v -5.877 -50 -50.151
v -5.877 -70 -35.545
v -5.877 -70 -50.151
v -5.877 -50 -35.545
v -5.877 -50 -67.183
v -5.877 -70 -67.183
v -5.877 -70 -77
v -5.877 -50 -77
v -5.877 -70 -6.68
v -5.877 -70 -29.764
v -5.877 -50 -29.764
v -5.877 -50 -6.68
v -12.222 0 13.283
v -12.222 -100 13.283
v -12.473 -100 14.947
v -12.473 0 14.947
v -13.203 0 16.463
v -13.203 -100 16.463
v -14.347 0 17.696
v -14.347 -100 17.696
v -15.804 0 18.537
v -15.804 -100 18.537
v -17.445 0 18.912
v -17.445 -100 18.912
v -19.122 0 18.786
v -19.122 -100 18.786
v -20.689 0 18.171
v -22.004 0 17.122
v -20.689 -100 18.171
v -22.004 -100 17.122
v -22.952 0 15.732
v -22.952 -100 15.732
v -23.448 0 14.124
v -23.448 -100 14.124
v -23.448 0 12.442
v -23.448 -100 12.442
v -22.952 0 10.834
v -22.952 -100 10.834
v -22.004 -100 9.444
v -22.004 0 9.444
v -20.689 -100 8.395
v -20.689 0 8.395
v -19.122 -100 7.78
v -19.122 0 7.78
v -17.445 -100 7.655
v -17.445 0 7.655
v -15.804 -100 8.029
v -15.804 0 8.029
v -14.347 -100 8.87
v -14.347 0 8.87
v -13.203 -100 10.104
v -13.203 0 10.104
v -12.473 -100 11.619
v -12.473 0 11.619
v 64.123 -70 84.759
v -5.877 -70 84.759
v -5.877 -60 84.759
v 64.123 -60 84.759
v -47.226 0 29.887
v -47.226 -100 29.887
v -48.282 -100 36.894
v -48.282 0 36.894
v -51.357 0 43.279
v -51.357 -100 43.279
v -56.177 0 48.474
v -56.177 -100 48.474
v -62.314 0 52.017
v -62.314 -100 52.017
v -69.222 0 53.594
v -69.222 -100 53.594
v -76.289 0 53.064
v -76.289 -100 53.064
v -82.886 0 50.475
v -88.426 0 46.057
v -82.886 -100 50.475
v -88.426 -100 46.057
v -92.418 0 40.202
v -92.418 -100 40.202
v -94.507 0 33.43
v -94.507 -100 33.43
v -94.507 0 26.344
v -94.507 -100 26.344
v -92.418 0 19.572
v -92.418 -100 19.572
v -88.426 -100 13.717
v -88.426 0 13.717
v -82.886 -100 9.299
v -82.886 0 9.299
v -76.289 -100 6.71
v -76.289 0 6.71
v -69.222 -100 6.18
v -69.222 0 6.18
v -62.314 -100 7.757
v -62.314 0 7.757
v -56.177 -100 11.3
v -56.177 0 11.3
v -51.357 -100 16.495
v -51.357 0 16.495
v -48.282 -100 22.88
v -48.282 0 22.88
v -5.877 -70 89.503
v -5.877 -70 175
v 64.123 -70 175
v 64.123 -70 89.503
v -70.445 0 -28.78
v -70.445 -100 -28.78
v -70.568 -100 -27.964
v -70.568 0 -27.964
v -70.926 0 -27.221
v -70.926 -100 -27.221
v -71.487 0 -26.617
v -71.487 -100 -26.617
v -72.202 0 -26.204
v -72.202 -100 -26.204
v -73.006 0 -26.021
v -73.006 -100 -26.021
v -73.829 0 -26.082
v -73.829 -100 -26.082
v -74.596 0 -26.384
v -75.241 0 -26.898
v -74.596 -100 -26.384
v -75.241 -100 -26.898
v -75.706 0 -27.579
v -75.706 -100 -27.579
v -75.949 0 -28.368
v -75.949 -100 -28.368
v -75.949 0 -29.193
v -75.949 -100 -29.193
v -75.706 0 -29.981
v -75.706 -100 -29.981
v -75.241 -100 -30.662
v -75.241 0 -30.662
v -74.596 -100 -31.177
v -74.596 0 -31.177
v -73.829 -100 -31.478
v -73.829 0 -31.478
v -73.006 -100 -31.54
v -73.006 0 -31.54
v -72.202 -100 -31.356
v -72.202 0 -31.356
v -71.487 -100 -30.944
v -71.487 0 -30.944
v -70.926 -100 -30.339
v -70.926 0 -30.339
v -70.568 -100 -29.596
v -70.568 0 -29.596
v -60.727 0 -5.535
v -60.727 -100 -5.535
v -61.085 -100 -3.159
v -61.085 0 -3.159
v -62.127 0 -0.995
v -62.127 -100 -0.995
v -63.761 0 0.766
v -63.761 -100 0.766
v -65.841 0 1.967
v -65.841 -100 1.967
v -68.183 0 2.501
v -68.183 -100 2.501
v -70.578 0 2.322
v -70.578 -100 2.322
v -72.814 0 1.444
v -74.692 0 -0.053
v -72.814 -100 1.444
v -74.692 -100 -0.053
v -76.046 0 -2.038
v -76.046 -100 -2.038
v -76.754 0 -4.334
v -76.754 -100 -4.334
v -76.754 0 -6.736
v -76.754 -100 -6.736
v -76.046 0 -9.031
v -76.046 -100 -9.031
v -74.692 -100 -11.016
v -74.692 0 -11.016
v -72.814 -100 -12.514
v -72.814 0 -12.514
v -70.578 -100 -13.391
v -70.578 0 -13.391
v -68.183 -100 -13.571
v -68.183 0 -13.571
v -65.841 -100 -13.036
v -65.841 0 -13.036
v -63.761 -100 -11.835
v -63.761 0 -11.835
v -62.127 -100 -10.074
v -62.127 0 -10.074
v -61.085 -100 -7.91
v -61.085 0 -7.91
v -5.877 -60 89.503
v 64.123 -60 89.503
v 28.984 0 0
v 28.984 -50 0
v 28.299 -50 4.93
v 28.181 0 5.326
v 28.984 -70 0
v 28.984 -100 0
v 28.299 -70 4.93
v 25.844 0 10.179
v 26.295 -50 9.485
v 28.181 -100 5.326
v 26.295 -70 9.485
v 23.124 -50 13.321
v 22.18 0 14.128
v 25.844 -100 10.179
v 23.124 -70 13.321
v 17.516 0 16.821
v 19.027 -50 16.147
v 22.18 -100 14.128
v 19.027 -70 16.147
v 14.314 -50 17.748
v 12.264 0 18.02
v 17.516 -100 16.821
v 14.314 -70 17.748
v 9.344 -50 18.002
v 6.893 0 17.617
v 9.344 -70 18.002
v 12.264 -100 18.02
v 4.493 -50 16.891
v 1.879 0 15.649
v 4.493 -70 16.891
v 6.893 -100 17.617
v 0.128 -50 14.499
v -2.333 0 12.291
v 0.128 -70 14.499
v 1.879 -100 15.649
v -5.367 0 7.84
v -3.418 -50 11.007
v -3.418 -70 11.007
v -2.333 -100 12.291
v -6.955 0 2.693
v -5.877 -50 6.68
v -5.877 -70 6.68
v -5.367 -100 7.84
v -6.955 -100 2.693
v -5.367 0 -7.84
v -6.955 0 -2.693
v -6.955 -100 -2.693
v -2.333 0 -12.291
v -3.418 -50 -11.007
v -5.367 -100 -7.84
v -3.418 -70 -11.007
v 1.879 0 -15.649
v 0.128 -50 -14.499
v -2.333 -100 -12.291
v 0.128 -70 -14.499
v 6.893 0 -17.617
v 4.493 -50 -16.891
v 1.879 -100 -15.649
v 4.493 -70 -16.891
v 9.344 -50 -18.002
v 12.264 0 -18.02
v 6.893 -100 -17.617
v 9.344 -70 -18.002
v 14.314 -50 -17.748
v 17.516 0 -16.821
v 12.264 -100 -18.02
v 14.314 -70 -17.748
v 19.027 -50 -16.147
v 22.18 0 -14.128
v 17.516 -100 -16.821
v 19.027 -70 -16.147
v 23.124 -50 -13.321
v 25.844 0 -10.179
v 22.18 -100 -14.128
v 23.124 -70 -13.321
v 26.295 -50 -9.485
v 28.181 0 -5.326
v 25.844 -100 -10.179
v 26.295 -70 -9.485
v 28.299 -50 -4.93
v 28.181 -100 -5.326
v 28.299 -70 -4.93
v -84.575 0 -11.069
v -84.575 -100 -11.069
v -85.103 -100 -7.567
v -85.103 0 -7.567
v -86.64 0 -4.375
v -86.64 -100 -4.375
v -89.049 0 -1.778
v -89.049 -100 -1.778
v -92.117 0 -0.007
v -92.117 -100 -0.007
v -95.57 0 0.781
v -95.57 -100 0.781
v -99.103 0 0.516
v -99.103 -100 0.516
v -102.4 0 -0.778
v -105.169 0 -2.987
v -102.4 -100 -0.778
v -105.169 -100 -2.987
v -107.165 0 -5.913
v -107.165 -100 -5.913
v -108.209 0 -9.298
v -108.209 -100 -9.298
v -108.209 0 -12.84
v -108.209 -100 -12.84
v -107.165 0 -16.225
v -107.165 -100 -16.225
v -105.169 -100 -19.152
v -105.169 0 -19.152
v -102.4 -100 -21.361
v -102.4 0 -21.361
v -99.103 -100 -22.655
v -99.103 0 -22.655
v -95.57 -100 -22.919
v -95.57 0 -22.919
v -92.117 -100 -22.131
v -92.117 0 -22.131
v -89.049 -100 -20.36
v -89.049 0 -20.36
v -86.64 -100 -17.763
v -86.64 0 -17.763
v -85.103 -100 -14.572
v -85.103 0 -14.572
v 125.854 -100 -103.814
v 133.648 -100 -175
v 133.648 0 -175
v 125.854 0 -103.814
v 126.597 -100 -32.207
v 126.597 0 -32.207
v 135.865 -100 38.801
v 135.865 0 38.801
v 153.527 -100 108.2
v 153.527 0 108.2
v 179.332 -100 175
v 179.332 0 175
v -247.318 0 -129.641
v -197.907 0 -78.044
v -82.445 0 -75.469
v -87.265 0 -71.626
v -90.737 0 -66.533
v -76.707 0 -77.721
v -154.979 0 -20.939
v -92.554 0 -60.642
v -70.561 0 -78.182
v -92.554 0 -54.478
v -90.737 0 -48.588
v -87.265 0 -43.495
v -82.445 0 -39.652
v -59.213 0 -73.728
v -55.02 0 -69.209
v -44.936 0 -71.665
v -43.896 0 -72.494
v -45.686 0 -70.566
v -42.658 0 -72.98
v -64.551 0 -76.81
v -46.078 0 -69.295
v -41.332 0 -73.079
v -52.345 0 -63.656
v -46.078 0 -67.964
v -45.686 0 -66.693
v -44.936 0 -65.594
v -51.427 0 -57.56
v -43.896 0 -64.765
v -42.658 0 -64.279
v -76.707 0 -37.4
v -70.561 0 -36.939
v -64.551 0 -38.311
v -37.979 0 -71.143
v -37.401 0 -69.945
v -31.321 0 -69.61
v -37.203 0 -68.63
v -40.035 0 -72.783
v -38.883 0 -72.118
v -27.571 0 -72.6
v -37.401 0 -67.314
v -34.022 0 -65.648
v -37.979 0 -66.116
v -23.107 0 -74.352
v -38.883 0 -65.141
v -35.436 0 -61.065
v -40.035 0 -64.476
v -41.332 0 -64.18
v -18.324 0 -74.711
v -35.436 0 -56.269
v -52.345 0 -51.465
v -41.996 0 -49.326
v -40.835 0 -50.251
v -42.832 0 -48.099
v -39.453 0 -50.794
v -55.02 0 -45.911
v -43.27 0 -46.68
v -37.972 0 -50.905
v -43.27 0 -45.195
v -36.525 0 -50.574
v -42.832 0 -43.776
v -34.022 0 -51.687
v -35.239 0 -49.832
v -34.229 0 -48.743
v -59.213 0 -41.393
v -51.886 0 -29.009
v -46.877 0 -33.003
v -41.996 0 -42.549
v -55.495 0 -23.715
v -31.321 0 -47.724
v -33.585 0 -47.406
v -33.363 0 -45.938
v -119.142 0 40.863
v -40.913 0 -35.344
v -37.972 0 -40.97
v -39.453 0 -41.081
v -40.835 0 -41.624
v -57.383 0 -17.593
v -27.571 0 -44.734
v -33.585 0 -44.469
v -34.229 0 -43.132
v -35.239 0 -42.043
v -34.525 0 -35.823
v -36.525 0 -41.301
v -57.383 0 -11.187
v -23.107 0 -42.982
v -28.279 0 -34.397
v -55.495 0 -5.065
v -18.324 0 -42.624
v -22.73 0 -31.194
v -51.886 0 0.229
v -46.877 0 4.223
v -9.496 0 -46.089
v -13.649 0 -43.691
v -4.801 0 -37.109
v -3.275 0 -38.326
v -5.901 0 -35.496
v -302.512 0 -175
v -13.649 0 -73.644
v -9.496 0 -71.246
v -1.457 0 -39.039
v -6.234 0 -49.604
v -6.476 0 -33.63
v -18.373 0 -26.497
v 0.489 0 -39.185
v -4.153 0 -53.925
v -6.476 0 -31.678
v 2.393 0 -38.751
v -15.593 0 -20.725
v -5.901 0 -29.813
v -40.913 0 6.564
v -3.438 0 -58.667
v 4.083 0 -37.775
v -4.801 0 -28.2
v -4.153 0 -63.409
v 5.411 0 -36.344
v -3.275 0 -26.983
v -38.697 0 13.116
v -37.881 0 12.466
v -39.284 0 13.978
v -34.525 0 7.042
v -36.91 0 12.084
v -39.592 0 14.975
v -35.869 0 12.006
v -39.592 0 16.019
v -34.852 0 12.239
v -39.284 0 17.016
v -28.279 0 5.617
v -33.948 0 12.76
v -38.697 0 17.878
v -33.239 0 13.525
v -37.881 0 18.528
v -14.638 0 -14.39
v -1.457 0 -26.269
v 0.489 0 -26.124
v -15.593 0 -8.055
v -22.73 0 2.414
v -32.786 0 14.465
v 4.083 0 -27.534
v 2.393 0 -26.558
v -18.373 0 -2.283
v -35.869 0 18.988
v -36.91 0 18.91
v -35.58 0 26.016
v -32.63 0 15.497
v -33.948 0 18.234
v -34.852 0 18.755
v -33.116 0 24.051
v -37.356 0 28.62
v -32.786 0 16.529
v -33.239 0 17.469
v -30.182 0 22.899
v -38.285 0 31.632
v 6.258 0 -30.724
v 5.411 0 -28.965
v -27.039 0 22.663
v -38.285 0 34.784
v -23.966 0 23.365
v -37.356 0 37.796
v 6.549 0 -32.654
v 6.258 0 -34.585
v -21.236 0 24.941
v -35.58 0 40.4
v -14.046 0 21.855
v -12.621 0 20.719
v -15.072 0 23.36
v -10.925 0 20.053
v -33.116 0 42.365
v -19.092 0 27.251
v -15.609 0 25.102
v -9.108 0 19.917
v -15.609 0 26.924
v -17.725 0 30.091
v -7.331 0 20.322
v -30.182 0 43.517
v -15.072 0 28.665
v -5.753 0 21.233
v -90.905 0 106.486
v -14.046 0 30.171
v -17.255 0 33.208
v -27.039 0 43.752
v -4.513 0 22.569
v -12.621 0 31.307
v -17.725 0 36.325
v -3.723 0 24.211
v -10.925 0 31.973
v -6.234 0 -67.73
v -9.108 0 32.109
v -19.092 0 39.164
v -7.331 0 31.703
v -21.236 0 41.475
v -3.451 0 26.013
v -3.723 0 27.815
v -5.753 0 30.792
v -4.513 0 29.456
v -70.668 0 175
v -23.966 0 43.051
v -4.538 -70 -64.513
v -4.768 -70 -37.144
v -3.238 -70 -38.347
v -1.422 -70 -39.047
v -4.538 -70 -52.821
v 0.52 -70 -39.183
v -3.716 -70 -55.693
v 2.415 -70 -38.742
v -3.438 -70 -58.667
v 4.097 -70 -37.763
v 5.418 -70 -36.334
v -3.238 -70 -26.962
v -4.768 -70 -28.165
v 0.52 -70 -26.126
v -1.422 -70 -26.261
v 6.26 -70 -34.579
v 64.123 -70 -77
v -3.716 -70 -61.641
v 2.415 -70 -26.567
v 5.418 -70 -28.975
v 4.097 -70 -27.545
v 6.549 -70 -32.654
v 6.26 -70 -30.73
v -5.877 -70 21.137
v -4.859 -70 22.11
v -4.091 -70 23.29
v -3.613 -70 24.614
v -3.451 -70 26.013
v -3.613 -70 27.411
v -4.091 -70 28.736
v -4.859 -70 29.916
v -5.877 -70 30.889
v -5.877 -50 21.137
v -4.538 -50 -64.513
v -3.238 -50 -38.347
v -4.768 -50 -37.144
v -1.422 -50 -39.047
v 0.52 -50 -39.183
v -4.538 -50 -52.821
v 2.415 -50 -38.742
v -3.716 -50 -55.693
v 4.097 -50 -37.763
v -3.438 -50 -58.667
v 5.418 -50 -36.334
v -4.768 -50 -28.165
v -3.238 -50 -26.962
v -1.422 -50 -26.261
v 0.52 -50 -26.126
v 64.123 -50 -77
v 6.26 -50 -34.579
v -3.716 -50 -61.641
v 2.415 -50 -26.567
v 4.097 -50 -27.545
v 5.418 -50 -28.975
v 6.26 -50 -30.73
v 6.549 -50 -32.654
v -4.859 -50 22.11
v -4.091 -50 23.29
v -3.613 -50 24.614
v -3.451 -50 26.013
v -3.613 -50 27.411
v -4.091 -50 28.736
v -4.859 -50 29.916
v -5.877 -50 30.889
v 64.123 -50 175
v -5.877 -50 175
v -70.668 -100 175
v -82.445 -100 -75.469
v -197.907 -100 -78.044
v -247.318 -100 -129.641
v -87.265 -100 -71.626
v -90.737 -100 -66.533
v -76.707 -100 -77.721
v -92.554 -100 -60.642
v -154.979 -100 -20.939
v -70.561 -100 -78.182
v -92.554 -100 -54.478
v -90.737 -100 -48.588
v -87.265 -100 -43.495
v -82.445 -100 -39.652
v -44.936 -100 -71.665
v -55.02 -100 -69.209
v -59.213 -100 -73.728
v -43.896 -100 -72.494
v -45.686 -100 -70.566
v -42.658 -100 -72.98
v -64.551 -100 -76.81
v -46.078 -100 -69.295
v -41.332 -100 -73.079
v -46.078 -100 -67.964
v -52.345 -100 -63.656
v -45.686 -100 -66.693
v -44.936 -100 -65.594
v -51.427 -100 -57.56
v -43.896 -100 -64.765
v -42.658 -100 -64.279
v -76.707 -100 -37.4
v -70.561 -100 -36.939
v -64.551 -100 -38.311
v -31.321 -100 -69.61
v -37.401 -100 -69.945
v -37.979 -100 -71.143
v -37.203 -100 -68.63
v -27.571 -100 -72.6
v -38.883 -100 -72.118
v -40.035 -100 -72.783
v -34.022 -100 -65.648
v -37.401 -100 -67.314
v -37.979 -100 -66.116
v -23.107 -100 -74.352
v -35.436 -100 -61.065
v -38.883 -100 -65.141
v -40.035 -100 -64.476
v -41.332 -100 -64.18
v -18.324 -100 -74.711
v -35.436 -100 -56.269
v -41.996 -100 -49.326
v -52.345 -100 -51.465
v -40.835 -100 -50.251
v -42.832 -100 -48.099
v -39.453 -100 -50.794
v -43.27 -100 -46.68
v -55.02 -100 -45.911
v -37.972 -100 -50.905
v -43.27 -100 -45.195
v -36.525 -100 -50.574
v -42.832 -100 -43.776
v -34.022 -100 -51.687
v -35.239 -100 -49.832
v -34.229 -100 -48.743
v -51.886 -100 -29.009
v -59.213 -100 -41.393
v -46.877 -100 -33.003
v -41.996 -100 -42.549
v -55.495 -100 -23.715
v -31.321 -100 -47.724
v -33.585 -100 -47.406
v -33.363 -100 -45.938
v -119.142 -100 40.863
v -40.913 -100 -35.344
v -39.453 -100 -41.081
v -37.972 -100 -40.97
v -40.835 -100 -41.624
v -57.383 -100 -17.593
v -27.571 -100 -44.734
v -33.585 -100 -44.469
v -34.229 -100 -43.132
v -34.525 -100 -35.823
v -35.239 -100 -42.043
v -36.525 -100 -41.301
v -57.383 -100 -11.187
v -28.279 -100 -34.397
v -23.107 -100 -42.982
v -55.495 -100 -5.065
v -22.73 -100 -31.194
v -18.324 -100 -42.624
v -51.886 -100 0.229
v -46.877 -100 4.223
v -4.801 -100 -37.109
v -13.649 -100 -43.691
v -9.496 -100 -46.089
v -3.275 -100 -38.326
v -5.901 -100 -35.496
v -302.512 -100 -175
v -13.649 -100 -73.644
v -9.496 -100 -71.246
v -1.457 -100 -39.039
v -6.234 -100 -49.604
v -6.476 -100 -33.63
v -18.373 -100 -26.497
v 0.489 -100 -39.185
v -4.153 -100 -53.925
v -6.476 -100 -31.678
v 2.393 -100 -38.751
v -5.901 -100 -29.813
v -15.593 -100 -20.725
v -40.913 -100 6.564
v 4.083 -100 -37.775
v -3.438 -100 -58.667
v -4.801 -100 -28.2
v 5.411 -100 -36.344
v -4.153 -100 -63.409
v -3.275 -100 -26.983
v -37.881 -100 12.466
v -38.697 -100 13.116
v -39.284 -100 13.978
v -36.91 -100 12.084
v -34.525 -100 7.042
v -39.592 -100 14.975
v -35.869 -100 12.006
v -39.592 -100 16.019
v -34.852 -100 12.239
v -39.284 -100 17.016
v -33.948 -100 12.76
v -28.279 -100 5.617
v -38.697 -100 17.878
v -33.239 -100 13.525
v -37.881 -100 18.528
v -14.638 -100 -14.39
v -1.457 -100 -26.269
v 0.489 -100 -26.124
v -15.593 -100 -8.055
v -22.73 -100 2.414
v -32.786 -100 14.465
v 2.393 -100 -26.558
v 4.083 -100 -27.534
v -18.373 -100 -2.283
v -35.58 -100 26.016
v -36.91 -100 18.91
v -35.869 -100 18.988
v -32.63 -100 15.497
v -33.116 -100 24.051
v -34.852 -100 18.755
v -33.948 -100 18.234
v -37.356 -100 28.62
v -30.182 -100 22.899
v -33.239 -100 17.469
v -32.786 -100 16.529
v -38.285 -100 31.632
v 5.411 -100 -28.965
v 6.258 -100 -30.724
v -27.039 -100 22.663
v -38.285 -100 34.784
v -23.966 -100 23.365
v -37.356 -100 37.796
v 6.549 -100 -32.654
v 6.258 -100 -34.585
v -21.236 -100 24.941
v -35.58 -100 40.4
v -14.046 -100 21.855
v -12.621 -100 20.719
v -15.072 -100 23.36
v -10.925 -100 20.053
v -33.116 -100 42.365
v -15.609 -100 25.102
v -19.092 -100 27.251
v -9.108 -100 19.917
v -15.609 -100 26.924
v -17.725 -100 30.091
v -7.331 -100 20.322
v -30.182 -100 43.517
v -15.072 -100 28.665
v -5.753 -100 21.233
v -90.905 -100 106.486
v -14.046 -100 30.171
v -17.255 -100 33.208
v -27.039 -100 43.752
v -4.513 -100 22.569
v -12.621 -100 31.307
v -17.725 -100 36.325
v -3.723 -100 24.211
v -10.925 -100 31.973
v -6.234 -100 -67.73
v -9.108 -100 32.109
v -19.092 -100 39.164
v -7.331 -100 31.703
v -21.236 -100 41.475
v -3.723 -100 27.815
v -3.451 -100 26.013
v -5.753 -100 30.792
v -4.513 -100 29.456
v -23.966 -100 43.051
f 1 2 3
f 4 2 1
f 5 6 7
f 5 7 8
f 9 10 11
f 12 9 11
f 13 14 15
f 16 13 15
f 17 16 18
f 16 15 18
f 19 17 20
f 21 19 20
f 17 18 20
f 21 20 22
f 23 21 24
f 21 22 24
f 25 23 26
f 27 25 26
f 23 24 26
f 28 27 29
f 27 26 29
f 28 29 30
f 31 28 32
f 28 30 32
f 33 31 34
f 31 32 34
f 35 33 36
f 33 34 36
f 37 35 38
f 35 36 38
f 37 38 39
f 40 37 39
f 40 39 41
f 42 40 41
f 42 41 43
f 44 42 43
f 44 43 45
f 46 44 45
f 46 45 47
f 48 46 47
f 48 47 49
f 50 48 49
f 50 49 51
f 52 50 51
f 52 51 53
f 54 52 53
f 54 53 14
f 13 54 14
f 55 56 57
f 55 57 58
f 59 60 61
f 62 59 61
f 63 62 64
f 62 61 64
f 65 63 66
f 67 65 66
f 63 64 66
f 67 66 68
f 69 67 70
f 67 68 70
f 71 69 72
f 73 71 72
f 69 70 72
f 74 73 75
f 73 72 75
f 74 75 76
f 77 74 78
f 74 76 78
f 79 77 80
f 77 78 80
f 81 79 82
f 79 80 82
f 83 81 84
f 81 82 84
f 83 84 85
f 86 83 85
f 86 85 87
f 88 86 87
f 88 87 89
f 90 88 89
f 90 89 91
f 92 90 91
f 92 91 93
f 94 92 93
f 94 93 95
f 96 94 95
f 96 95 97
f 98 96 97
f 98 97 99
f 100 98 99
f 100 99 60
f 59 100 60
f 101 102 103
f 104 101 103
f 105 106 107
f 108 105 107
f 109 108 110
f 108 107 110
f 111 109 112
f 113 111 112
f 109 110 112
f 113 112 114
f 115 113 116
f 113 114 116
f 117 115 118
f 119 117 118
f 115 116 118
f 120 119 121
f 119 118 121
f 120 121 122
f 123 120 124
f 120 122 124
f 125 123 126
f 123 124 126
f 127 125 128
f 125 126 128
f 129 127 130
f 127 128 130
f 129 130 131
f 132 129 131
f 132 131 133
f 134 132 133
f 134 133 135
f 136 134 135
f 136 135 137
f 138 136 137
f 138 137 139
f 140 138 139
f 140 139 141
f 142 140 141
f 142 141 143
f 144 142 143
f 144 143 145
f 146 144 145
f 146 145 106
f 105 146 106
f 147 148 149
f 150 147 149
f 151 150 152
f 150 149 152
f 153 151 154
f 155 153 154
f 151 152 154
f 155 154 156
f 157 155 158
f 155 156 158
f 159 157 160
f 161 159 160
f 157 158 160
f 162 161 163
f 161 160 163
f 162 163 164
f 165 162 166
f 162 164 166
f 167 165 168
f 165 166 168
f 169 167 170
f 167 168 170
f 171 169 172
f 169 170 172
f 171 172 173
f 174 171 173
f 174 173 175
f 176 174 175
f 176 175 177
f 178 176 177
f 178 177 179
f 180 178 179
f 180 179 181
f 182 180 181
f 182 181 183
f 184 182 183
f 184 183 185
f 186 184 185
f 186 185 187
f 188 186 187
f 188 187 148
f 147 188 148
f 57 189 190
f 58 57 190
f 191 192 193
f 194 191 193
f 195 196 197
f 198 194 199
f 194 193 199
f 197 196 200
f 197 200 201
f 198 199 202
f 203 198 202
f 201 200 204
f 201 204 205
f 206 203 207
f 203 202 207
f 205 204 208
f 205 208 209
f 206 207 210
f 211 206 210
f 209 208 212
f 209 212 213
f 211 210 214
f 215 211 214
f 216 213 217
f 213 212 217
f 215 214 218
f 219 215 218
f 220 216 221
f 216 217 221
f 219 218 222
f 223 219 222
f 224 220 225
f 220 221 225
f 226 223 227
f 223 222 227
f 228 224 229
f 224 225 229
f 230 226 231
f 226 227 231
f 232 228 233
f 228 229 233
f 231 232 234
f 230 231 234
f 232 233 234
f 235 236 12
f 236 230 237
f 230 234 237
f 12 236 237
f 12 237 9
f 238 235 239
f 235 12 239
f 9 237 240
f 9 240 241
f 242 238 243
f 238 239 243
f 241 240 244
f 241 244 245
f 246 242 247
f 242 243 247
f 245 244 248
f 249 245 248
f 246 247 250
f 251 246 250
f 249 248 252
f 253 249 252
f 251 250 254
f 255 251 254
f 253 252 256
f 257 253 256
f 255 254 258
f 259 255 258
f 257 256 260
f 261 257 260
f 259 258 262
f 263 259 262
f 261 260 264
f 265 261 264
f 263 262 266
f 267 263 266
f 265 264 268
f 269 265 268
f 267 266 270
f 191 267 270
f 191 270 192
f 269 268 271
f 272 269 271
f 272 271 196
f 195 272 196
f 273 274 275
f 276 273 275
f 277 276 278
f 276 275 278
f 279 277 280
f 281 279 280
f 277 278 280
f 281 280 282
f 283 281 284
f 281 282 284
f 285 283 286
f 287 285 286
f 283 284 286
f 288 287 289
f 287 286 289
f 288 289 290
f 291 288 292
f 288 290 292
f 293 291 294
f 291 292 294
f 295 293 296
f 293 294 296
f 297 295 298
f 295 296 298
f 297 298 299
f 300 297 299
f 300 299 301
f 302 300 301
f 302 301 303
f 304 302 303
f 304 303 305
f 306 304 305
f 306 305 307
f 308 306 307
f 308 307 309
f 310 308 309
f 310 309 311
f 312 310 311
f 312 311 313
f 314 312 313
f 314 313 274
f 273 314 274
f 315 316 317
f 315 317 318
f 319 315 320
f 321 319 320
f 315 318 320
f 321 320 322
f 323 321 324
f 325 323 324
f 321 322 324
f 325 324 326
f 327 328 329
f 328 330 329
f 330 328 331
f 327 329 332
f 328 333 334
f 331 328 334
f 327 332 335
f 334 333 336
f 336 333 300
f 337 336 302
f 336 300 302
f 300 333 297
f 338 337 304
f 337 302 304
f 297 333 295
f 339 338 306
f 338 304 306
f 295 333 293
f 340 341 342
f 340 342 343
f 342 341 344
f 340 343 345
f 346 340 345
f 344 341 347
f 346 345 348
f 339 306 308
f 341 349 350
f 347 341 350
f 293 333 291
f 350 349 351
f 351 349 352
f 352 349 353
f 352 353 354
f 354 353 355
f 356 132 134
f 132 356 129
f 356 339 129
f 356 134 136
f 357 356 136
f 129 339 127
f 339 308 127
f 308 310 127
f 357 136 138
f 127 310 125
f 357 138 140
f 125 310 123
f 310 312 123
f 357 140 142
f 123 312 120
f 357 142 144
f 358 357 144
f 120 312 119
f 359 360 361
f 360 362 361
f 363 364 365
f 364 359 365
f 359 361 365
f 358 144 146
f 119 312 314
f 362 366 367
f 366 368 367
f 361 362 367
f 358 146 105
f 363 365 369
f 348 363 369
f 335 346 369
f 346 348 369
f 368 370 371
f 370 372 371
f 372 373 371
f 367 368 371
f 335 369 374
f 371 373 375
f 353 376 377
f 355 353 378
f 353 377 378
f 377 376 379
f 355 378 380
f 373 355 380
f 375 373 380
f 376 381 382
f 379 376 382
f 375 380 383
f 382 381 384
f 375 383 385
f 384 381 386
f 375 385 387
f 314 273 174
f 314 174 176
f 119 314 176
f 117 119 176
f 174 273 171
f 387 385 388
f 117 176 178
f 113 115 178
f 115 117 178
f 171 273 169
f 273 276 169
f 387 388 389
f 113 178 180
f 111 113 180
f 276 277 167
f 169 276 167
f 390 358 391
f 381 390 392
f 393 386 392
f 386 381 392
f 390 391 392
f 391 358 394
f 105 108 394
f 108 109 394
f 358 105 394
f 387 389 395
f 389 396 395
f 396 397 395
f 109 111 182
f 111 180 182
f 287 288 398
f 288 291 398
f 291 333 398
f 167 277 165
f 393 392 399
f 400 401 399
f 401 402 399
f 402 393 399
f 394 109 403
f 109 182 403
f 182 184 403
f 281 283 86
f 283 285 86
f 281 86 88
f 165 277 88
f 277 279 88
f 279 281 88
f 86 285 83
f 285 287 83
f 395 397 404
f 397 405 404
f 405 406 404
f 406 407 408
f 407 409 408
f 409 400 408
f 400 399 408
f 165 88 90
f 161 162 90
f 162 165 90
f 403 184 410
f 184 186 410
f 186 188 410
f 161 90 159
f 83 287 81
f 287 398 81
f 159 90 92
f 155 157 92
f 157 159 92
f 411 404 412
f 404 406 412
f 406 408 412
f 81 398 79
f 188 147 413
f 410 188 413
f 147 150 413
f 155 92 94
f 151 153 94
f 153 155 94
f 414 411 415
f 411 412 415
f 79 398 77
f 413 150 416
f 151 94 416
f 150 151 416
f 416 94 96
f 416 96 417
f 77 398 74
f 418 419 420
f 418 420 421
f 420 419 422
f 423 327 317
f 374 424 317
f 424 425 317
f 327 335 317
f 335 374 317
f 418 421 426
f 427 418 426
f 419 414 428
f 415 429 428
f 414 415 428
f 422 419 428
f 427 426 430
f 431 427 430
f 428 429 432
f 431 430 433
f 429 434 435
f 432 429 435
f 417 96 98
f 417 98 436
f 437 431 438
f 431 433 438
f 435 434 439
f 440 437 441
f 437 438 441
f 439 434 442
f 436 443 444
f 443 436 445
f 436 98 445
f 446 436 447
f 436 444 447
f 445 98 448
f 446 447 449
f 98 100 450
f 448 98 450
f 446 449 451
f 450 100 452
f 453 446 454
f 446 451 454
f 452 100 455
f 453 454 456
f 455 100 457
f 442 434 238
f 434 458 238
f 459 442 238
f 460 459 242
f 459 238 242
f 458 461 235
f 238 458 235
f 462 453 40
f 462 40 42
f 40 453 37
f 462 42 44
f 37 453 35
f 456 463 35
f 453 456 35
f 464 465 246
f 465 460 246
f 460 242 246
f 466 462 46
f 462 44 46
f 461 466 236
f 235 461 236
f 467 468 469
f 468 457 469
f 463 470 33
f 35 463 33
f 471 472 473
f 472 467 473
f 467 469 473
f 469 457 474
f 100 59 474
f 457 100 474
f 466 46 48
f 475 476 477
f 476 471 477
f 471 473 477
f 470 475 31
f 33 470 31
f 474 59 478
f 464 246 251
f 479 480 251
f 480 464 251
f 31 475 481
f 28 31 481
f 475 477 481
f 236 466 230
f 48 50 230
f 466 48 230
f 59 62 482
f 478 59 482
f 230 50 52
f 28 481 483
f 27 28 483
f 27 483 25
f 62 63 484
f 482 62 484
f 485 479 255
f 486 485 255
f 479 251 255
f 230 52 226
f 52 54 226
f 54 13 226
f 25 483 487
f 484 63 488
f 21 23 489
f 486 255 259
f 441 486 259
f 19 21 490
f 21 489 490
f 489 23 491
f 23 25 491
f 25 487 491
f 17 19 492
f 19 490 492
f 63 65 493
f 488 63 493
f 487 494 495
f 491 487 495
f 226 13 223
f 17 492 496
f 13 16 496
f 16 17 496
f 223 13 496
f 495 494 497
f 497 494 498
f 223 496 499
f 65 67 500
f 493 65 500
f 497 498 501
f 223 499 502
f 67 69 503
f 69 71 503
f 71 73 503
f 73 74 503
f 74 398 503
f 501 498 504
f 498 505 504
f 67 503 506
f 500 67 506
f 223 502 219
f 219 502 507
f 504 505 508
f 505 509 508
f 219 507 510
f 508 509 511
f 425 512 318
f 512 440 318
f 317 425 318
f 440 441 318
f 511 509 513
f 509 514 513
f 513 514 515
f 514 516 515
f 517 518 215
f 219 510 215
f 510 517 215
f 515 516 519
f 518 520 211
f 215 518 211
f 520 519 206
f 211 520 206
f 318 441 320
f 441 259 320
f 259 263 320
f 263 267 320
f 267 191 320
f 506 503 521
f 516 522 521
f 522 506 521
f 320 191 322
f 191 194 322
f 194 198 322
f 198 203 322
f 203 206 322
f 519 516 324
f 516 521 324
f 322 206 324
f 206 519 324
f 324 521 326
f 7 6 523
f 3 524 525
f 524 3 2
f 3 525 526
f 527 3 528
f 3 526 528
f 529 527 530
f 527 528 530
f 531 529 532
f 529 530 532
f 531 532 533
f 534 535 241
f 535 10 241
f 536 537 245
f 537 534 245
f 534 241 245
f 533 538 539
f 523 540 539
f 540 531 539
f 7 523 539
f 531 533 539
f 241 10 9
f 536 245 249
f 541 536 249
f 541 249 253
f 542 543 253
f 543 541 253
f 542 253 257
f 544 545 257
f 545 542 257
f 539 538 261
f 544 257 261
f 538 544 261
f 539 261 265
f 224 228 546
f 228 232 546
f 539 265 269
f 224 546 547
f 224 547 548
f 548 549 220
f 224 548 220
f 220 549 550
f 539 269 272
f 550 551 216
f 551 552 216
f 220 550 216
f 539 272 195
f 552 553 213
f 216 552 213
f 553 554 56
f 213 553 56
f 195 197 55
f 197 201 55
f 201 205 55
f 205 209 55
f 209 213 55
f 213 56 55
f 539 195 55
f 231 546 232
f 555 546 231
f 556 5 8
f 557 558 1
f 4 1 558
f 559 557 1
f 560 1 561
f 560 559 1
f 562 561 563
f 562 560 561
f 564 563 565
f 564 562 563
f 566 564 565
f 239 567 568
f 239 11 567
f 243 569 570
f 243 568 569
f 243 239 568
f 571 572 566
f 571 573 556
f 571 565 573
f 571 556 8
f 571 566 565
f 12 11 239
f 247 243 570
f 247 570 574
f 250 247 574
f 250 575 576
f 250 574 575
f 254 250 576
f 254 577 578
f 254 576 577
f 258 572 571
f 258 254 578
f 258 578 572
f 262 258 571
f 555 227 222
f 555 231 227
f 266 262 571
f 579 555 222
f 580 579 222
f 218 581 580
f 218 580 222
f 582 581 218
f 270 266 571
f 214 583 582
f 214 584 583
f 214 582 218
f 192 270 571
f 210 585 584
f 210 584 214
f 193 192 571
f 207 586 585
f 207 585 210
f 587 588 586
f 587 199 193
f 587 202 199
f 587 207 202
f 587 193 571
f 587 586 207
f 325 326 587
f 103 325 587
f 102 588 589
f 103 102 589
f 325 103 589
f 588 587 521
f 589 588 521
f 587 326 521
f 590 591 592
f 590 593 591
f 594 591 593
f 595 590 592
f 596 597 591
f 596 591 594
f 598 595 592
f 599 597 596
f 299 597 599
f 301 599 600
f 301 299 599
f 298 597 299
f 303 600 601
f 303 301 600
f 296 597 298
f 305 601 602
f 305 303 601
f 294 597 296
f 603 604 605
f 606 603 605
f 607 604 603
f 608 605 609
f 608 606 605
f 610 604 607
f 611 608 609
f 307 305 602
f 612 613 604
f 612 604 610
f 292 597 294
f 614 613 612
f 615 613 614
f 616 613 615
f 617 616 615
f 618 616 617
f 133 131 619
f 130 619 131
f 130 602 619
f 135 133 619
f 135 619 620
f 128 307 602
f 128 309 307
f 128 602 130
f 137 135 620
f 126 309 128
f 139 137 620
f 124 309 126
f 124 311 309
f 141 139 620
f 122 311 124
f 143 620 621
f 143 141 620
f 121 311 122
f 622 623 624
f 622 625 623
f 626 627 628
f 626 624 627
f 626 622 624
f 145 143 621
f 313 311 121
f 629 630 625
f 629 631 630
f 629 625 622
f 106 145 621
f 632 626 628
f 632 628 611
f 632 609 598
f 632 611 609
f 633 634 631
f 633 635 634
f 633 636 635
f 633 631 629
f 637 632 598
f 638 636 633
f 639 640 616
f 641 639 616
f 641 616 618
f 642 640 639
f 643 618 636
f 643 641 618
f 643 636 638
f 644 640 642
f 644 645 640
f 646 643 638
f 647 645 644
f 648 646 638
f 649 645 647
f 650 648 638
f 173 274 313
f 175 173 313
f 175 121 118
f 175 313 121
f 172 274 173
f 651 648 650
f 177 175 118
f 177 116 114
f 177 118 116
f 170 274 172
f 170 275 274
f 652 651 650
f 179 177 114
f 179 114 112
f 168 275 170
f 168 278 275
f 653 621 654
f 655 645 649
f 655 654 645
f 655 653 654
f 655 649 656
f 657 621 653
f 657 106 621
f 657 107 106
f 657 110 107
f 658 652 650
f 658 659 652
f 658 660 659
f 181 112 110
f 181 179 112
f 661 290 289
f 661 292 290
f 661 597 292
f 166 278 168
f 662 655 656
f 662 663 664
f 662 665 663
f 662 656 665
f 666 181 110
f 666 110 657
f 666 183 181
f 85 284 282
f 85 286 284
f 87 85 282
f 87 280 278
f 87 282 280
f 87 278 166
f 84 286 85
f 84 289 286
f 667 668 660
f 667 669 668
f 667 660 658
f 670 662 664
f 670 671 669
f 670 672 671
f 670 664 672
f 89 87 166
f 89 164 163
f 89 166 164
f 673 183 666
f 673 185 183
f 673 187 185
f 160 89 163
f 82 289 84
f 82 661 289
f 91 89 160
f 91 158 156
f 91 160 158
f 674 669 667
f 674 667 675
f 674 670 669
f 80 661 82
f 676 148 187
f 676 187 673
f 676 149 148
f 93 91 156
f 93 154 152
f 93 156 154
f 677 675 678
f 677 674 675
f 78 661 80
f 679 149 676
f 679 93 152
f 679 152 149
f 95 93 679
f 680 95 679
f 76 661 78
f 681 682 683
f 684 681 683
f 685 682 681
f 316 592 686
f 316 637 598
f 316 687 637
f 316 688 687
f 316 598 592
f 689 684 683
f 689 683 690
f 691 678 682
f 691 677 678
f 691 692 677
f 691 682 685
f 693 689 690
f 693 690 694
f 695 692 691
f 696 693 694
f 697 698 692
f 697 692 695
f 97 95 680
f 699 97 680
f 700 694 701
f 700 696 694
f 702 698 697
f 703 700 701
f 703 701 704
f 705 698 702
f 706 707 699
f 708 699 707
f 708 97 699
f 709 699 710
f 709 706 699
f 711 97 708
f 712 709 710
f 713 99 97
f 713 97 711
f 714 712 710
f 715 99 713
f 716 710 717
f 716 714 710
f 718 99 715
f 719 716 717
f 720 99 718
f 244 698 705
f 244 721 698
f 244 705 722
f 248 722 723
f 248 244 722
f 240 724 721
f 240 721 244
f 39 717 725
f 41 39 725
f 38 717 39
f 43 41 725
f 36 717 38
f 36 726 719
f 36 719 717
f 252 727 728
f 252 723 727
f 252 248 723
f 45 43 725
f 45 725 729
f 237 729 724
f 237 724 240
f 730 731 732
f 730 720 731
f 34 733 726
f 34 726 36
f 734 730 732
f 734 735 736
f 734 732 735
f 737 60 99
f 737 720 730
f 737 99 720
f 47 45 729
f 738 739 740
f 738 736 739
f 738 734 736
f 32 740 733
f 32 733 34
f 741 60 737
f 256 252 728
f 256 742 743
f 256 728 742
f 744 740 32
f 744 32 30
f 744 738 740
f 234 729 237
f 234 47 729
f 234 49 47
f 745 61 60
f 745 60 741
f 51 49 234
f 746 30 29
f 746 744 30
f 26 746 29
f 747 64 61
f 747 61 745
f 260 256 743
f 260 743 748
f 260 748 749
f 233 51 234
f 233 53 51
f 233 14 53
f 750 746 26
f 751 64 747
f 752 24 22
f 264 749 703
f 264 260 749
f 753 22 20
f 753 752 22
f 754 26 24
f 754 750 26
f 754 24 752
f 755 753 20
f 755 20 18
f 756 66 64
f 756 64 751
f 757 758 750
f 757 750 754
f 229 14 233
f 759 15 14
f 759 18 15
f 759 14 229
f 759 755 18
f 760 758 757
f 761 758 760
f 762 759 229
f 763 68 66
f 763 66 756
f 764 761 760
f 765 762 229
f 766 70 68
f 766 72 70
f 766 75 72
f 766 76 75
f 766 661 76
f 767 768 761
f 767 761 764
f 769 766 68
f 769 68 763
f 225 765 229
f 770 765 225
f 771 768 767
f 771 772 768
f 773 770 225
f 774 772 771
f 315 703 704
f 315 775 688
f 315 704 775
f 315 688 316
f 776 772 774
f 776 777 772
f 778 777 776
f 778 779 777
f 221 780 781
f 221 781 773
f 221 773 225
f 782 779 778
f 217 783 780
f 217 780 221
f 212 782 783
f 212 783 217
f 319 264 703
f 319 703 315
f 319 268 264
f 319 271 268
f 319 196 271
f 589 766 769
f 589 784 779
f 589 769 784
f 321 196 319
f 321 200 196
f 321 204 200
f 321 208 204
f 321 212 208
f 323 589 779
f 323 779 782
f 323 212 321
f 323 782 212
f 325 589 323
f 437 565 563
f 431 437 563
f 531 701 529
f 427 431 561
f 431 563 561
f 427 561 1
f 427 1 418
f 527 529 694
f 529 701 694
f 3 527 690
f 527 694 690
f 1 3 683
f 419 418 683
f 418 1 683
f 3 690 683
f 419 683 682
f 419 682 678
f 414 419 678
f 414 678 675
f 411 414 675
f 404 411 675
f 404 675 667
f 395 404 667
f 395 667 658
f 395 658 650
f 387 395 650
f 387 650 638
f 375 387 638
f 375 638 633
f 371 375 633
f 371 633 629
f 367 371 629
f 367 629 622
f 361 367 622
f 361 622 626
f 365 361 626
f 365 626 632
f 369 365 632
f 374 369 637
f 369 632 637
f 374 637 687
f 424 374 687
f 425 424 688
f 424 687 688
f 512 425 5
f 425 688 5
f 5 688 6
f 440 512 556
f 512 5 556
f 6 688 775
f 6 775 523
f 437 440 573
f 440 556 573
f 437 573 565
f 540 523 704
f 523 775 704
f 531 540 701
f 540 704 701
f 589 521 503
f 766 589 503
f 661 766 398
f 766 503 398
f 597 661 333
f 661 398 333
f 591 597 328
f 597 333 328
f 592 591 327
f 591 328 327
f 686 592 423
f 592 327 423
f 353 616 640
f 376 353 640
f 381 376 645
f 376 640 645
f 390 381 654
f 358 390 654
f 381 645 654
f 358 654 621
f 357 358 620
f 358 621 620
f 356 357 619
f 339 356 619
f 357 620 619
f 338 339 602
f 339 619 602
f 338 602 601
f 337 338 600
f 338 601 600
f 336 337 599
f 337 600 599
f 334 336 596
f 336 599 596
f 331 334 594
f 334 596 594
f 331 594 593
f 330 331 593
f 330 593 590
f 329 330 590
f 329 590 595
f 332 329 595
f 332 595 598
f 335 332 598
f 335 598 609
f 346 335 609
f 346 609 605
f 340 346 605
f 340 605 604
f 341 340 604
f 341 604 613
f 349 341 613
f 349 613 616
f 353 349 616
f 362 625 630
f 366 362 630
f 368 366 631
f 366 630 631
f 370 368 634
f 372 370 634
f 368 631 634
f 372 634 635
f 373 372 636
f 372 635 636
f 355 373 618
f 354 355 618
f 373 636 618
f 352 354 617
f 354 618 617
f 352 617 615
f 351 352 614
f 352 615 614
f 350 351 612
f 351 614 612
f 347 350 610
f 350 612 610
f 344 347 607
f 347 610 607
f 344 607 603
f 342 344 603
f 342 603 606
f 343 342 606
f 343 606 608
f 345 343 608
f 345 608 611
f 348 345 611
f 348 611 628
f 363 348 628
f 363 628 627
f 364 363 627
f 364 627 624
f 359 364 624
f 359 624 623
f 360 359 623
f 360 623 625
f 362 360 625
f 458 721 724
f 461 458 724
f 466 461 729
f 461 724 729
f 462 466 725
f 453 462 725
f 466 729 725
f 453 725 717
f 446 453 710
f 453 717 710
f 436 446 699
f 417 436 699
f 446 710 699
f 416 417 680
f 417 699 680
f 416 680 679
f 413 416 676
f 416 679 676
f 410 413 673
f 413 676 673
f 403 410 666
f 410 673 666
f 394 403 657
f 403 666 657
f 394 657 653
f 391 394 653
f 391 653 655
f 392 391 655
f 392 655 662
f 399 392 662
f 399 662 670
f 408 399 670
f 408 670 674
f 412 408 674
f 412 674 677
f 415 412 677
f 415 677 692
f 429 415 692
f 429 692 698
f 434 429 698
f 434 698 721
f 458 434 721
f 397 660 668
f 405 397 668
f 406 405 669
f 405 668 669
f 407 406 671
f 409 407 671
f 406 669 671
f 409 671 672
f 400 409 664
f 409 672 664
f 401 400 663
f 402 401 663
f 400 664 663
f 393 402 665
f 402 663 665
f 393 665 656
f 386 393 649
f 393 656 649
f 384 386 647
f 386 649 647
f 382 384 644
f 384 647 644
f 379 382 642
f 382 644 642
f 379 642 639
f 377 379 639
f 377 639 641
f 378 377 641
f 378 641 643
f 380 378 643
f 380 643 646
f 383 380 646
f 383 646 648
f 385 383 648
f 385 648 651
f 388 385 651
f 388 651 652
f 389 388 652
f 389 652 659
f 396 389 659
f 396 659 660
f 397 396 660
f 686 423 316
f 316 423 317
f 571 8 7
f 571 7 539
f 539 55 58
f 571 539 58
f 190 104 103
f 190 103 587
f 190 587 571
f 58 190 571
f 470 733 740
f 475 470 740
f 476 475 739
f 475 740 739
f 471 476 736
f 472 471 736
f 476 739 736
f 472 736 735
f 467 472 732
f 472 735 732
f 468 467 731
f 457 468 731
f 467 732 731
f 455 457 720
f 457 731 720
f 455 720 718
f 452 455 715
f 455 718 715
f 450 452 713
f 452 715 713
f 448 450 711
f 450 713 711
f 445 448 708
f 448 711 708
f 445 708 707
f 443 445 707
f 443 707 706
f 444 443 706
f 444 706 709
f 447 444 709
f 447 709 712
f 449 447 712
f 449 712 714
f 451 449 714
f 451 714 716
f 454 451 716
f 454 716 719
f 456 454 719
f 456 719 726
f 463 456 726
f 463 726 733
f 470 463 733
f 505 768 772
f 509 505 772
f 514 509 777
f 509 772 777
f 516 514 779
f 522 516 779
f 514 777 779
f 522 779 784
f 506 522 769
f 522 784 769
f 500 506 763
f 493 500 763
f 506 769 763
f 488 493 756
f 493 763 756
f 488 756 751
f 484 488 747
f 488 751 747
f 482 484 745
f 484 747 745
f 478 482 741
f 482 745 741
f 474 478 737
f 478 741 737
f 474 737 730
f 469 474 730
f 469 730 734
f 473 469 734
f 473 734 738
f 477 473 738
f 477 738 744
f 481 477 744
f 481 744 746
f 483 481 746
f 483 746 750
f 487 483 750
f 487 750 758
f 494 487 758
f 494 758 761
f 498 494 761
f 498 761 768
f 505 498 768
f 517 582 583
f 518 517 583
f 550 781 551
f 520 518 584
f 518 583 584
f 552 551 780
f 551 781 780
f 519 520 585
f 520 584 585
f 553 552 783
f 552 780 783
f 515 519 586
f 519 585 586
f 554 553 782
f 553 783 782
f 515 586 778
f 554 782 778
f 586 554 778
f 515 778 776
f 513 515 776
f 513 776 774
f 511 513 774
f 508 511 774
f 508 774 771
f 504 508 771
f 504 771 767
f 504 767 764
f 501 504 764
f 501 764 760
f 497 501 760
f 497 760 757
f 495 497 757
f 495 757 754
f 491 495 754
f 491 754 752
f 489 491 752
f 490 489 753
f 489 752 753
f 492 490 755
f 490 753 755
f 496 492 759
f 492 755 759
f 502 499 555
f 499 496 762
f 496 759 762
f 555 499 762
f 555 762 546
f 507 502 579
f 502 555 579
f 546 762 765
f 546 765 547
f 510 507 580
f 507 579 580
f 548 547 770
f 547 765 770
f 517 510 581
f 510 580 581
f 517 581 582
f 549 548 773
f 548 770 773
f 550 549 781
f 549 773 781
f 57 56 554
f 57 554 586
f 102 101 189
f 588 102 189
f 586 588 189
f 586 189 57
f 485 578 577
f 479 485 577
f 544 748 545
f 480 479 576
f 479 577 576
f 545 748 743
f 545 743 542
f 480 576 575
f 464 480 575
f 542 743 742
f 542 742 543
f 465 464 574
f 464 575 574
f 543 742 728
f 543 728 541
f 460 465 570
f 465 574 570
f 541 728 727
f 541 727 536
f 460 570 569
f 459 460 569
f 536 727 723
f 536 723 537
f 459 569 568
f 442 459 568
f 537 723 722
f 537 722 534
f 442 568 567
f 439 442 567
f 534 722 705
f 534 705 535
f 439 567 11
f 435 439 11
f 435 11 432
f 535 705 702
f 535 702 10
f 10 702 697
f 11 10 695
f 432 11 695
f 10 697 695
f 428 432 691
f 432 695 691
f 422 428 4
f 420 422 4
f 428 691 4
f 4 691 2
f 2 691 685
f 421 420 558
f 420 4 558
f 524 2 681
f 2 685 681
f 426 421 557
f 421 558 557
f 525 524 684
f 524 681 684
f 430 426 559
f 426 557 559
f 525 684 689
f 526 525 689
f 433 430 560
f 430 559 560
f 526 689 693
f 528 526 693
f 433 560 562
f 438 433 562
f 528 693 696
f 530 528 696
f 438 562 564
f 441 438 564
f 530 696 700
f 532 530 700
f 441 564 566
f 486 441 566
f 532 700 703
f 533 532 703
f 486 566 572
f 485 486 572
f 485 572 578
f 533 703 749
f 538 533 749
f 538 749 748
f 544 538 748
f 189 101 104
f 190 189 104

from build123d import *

# Parameters (mm, degrees)
F1_DEPTH = 100
F2_W     = 70
F2_H     = 20
F3_DEPTH = 252
F4_W     = 137.891564
F4_H     = 4.743971
F5_DEPTH = 40
F6_R     = 23.773189
F6_R_2   = 21.492651
F6_R_3   = 20.679115
F6_R_4   = 11.883374
F6_R_5   = 6.549136
F6_R_6   = 16.088576
F6_R_7   = 18.070401
F6_R_8   = 10.573912
F6_R_9   = 6.113208
F6_R_10  = 8.058557
F6_R_11  = 2.767323
F6_R_12  = 4.981171
F6_R_13  = 4.462164
F6_R_14  = 5.644248
F6_R_15  = 3.500411
F7_DEPTH = 357


with BuildPart() as f1:
    # F0 (on Front) → F1 (new body)
    with BuildSketch(Plane.XZ):
        with BuildLine():
            Line((179.331843, 175), (-70.668157, 175))
            ThreePointArc((-70.668157, 175), (-154.979102, -20.939428), (-302.511929, -175))
            Line((-302.511929, -175), (133.648471, -175))
            ThreePointArc((133.648471, -175), (130.170691, 3.43532), (179.331843, 175))
        make_face()
    extrude(amount=F1_DEPTH)

    # F2 (on face) → F3 (cut)
    with BuildSketch(Plane.XY.offset(175)):
        with Locations((29.123203, -60)):
            Rectangle(F2_W, F2_H)
    extrude(amount=-F3_DEPTH, mode=Mode.SUBTRACT)

    # F4 (on face) → F5 (join)
    with BuildSketch(Plane.XZ.offset(100)):
        with Locations((42.198492, 87.131027)):
            Rectangle(F4_W, F4_H)
    extrude(amount=-F5_DEPTH)

    # F6 (on face) → F7 (cut)
    with BuildSketch(Plane.XZ.offset(100)):
        with Locations((-70.998937, 29.887047)):
            Circle(F6_R)
        with Locations((-36.130711, -14.39006)):
            Circle(F6_R_2)
        with Locations((-72.105862, -57.560239)):
            Circle(F6_R_3)
        with Locations((-96.458264, -11.069277)):
            Circle(F6_R_4)
        with Locations((0, -32.654367)):
            Circle(F6_R_5)
        with Locations((-19.526798, -58.667168)):
            Circle(F6_R_6)
        with Locations((10.913723, 0)):
            Circle(F6_R_7)
        with Locations((-27.828749, 33.20783)):
            Circle(F6_R_8)
        with Locations((-9.564446, 26.012801)):
            Circle(F6_R_9)
        with Locations((-68.785071, -5.534639)):
            Circle(F6_R_10)
        with Locations((-73.212788, -28.780119)):
            Circle(F6_R_11)
        with Locations((-38.344566, -45.937501)):
            Circle(F6_R_12)
        with Locations((-41.665345, -68.629518)):
            Circle(F6_R_13)
        with Locations((-17.866395, 13.283132)):
            Circle(F6_R_14)
        with Locations((-36.130711, 15.496987)):
            Circle(F6_R_15)
    extrude(amount=-F7_DEPTH, mode=Mode.SUBTRACT)


solid = f1.part
